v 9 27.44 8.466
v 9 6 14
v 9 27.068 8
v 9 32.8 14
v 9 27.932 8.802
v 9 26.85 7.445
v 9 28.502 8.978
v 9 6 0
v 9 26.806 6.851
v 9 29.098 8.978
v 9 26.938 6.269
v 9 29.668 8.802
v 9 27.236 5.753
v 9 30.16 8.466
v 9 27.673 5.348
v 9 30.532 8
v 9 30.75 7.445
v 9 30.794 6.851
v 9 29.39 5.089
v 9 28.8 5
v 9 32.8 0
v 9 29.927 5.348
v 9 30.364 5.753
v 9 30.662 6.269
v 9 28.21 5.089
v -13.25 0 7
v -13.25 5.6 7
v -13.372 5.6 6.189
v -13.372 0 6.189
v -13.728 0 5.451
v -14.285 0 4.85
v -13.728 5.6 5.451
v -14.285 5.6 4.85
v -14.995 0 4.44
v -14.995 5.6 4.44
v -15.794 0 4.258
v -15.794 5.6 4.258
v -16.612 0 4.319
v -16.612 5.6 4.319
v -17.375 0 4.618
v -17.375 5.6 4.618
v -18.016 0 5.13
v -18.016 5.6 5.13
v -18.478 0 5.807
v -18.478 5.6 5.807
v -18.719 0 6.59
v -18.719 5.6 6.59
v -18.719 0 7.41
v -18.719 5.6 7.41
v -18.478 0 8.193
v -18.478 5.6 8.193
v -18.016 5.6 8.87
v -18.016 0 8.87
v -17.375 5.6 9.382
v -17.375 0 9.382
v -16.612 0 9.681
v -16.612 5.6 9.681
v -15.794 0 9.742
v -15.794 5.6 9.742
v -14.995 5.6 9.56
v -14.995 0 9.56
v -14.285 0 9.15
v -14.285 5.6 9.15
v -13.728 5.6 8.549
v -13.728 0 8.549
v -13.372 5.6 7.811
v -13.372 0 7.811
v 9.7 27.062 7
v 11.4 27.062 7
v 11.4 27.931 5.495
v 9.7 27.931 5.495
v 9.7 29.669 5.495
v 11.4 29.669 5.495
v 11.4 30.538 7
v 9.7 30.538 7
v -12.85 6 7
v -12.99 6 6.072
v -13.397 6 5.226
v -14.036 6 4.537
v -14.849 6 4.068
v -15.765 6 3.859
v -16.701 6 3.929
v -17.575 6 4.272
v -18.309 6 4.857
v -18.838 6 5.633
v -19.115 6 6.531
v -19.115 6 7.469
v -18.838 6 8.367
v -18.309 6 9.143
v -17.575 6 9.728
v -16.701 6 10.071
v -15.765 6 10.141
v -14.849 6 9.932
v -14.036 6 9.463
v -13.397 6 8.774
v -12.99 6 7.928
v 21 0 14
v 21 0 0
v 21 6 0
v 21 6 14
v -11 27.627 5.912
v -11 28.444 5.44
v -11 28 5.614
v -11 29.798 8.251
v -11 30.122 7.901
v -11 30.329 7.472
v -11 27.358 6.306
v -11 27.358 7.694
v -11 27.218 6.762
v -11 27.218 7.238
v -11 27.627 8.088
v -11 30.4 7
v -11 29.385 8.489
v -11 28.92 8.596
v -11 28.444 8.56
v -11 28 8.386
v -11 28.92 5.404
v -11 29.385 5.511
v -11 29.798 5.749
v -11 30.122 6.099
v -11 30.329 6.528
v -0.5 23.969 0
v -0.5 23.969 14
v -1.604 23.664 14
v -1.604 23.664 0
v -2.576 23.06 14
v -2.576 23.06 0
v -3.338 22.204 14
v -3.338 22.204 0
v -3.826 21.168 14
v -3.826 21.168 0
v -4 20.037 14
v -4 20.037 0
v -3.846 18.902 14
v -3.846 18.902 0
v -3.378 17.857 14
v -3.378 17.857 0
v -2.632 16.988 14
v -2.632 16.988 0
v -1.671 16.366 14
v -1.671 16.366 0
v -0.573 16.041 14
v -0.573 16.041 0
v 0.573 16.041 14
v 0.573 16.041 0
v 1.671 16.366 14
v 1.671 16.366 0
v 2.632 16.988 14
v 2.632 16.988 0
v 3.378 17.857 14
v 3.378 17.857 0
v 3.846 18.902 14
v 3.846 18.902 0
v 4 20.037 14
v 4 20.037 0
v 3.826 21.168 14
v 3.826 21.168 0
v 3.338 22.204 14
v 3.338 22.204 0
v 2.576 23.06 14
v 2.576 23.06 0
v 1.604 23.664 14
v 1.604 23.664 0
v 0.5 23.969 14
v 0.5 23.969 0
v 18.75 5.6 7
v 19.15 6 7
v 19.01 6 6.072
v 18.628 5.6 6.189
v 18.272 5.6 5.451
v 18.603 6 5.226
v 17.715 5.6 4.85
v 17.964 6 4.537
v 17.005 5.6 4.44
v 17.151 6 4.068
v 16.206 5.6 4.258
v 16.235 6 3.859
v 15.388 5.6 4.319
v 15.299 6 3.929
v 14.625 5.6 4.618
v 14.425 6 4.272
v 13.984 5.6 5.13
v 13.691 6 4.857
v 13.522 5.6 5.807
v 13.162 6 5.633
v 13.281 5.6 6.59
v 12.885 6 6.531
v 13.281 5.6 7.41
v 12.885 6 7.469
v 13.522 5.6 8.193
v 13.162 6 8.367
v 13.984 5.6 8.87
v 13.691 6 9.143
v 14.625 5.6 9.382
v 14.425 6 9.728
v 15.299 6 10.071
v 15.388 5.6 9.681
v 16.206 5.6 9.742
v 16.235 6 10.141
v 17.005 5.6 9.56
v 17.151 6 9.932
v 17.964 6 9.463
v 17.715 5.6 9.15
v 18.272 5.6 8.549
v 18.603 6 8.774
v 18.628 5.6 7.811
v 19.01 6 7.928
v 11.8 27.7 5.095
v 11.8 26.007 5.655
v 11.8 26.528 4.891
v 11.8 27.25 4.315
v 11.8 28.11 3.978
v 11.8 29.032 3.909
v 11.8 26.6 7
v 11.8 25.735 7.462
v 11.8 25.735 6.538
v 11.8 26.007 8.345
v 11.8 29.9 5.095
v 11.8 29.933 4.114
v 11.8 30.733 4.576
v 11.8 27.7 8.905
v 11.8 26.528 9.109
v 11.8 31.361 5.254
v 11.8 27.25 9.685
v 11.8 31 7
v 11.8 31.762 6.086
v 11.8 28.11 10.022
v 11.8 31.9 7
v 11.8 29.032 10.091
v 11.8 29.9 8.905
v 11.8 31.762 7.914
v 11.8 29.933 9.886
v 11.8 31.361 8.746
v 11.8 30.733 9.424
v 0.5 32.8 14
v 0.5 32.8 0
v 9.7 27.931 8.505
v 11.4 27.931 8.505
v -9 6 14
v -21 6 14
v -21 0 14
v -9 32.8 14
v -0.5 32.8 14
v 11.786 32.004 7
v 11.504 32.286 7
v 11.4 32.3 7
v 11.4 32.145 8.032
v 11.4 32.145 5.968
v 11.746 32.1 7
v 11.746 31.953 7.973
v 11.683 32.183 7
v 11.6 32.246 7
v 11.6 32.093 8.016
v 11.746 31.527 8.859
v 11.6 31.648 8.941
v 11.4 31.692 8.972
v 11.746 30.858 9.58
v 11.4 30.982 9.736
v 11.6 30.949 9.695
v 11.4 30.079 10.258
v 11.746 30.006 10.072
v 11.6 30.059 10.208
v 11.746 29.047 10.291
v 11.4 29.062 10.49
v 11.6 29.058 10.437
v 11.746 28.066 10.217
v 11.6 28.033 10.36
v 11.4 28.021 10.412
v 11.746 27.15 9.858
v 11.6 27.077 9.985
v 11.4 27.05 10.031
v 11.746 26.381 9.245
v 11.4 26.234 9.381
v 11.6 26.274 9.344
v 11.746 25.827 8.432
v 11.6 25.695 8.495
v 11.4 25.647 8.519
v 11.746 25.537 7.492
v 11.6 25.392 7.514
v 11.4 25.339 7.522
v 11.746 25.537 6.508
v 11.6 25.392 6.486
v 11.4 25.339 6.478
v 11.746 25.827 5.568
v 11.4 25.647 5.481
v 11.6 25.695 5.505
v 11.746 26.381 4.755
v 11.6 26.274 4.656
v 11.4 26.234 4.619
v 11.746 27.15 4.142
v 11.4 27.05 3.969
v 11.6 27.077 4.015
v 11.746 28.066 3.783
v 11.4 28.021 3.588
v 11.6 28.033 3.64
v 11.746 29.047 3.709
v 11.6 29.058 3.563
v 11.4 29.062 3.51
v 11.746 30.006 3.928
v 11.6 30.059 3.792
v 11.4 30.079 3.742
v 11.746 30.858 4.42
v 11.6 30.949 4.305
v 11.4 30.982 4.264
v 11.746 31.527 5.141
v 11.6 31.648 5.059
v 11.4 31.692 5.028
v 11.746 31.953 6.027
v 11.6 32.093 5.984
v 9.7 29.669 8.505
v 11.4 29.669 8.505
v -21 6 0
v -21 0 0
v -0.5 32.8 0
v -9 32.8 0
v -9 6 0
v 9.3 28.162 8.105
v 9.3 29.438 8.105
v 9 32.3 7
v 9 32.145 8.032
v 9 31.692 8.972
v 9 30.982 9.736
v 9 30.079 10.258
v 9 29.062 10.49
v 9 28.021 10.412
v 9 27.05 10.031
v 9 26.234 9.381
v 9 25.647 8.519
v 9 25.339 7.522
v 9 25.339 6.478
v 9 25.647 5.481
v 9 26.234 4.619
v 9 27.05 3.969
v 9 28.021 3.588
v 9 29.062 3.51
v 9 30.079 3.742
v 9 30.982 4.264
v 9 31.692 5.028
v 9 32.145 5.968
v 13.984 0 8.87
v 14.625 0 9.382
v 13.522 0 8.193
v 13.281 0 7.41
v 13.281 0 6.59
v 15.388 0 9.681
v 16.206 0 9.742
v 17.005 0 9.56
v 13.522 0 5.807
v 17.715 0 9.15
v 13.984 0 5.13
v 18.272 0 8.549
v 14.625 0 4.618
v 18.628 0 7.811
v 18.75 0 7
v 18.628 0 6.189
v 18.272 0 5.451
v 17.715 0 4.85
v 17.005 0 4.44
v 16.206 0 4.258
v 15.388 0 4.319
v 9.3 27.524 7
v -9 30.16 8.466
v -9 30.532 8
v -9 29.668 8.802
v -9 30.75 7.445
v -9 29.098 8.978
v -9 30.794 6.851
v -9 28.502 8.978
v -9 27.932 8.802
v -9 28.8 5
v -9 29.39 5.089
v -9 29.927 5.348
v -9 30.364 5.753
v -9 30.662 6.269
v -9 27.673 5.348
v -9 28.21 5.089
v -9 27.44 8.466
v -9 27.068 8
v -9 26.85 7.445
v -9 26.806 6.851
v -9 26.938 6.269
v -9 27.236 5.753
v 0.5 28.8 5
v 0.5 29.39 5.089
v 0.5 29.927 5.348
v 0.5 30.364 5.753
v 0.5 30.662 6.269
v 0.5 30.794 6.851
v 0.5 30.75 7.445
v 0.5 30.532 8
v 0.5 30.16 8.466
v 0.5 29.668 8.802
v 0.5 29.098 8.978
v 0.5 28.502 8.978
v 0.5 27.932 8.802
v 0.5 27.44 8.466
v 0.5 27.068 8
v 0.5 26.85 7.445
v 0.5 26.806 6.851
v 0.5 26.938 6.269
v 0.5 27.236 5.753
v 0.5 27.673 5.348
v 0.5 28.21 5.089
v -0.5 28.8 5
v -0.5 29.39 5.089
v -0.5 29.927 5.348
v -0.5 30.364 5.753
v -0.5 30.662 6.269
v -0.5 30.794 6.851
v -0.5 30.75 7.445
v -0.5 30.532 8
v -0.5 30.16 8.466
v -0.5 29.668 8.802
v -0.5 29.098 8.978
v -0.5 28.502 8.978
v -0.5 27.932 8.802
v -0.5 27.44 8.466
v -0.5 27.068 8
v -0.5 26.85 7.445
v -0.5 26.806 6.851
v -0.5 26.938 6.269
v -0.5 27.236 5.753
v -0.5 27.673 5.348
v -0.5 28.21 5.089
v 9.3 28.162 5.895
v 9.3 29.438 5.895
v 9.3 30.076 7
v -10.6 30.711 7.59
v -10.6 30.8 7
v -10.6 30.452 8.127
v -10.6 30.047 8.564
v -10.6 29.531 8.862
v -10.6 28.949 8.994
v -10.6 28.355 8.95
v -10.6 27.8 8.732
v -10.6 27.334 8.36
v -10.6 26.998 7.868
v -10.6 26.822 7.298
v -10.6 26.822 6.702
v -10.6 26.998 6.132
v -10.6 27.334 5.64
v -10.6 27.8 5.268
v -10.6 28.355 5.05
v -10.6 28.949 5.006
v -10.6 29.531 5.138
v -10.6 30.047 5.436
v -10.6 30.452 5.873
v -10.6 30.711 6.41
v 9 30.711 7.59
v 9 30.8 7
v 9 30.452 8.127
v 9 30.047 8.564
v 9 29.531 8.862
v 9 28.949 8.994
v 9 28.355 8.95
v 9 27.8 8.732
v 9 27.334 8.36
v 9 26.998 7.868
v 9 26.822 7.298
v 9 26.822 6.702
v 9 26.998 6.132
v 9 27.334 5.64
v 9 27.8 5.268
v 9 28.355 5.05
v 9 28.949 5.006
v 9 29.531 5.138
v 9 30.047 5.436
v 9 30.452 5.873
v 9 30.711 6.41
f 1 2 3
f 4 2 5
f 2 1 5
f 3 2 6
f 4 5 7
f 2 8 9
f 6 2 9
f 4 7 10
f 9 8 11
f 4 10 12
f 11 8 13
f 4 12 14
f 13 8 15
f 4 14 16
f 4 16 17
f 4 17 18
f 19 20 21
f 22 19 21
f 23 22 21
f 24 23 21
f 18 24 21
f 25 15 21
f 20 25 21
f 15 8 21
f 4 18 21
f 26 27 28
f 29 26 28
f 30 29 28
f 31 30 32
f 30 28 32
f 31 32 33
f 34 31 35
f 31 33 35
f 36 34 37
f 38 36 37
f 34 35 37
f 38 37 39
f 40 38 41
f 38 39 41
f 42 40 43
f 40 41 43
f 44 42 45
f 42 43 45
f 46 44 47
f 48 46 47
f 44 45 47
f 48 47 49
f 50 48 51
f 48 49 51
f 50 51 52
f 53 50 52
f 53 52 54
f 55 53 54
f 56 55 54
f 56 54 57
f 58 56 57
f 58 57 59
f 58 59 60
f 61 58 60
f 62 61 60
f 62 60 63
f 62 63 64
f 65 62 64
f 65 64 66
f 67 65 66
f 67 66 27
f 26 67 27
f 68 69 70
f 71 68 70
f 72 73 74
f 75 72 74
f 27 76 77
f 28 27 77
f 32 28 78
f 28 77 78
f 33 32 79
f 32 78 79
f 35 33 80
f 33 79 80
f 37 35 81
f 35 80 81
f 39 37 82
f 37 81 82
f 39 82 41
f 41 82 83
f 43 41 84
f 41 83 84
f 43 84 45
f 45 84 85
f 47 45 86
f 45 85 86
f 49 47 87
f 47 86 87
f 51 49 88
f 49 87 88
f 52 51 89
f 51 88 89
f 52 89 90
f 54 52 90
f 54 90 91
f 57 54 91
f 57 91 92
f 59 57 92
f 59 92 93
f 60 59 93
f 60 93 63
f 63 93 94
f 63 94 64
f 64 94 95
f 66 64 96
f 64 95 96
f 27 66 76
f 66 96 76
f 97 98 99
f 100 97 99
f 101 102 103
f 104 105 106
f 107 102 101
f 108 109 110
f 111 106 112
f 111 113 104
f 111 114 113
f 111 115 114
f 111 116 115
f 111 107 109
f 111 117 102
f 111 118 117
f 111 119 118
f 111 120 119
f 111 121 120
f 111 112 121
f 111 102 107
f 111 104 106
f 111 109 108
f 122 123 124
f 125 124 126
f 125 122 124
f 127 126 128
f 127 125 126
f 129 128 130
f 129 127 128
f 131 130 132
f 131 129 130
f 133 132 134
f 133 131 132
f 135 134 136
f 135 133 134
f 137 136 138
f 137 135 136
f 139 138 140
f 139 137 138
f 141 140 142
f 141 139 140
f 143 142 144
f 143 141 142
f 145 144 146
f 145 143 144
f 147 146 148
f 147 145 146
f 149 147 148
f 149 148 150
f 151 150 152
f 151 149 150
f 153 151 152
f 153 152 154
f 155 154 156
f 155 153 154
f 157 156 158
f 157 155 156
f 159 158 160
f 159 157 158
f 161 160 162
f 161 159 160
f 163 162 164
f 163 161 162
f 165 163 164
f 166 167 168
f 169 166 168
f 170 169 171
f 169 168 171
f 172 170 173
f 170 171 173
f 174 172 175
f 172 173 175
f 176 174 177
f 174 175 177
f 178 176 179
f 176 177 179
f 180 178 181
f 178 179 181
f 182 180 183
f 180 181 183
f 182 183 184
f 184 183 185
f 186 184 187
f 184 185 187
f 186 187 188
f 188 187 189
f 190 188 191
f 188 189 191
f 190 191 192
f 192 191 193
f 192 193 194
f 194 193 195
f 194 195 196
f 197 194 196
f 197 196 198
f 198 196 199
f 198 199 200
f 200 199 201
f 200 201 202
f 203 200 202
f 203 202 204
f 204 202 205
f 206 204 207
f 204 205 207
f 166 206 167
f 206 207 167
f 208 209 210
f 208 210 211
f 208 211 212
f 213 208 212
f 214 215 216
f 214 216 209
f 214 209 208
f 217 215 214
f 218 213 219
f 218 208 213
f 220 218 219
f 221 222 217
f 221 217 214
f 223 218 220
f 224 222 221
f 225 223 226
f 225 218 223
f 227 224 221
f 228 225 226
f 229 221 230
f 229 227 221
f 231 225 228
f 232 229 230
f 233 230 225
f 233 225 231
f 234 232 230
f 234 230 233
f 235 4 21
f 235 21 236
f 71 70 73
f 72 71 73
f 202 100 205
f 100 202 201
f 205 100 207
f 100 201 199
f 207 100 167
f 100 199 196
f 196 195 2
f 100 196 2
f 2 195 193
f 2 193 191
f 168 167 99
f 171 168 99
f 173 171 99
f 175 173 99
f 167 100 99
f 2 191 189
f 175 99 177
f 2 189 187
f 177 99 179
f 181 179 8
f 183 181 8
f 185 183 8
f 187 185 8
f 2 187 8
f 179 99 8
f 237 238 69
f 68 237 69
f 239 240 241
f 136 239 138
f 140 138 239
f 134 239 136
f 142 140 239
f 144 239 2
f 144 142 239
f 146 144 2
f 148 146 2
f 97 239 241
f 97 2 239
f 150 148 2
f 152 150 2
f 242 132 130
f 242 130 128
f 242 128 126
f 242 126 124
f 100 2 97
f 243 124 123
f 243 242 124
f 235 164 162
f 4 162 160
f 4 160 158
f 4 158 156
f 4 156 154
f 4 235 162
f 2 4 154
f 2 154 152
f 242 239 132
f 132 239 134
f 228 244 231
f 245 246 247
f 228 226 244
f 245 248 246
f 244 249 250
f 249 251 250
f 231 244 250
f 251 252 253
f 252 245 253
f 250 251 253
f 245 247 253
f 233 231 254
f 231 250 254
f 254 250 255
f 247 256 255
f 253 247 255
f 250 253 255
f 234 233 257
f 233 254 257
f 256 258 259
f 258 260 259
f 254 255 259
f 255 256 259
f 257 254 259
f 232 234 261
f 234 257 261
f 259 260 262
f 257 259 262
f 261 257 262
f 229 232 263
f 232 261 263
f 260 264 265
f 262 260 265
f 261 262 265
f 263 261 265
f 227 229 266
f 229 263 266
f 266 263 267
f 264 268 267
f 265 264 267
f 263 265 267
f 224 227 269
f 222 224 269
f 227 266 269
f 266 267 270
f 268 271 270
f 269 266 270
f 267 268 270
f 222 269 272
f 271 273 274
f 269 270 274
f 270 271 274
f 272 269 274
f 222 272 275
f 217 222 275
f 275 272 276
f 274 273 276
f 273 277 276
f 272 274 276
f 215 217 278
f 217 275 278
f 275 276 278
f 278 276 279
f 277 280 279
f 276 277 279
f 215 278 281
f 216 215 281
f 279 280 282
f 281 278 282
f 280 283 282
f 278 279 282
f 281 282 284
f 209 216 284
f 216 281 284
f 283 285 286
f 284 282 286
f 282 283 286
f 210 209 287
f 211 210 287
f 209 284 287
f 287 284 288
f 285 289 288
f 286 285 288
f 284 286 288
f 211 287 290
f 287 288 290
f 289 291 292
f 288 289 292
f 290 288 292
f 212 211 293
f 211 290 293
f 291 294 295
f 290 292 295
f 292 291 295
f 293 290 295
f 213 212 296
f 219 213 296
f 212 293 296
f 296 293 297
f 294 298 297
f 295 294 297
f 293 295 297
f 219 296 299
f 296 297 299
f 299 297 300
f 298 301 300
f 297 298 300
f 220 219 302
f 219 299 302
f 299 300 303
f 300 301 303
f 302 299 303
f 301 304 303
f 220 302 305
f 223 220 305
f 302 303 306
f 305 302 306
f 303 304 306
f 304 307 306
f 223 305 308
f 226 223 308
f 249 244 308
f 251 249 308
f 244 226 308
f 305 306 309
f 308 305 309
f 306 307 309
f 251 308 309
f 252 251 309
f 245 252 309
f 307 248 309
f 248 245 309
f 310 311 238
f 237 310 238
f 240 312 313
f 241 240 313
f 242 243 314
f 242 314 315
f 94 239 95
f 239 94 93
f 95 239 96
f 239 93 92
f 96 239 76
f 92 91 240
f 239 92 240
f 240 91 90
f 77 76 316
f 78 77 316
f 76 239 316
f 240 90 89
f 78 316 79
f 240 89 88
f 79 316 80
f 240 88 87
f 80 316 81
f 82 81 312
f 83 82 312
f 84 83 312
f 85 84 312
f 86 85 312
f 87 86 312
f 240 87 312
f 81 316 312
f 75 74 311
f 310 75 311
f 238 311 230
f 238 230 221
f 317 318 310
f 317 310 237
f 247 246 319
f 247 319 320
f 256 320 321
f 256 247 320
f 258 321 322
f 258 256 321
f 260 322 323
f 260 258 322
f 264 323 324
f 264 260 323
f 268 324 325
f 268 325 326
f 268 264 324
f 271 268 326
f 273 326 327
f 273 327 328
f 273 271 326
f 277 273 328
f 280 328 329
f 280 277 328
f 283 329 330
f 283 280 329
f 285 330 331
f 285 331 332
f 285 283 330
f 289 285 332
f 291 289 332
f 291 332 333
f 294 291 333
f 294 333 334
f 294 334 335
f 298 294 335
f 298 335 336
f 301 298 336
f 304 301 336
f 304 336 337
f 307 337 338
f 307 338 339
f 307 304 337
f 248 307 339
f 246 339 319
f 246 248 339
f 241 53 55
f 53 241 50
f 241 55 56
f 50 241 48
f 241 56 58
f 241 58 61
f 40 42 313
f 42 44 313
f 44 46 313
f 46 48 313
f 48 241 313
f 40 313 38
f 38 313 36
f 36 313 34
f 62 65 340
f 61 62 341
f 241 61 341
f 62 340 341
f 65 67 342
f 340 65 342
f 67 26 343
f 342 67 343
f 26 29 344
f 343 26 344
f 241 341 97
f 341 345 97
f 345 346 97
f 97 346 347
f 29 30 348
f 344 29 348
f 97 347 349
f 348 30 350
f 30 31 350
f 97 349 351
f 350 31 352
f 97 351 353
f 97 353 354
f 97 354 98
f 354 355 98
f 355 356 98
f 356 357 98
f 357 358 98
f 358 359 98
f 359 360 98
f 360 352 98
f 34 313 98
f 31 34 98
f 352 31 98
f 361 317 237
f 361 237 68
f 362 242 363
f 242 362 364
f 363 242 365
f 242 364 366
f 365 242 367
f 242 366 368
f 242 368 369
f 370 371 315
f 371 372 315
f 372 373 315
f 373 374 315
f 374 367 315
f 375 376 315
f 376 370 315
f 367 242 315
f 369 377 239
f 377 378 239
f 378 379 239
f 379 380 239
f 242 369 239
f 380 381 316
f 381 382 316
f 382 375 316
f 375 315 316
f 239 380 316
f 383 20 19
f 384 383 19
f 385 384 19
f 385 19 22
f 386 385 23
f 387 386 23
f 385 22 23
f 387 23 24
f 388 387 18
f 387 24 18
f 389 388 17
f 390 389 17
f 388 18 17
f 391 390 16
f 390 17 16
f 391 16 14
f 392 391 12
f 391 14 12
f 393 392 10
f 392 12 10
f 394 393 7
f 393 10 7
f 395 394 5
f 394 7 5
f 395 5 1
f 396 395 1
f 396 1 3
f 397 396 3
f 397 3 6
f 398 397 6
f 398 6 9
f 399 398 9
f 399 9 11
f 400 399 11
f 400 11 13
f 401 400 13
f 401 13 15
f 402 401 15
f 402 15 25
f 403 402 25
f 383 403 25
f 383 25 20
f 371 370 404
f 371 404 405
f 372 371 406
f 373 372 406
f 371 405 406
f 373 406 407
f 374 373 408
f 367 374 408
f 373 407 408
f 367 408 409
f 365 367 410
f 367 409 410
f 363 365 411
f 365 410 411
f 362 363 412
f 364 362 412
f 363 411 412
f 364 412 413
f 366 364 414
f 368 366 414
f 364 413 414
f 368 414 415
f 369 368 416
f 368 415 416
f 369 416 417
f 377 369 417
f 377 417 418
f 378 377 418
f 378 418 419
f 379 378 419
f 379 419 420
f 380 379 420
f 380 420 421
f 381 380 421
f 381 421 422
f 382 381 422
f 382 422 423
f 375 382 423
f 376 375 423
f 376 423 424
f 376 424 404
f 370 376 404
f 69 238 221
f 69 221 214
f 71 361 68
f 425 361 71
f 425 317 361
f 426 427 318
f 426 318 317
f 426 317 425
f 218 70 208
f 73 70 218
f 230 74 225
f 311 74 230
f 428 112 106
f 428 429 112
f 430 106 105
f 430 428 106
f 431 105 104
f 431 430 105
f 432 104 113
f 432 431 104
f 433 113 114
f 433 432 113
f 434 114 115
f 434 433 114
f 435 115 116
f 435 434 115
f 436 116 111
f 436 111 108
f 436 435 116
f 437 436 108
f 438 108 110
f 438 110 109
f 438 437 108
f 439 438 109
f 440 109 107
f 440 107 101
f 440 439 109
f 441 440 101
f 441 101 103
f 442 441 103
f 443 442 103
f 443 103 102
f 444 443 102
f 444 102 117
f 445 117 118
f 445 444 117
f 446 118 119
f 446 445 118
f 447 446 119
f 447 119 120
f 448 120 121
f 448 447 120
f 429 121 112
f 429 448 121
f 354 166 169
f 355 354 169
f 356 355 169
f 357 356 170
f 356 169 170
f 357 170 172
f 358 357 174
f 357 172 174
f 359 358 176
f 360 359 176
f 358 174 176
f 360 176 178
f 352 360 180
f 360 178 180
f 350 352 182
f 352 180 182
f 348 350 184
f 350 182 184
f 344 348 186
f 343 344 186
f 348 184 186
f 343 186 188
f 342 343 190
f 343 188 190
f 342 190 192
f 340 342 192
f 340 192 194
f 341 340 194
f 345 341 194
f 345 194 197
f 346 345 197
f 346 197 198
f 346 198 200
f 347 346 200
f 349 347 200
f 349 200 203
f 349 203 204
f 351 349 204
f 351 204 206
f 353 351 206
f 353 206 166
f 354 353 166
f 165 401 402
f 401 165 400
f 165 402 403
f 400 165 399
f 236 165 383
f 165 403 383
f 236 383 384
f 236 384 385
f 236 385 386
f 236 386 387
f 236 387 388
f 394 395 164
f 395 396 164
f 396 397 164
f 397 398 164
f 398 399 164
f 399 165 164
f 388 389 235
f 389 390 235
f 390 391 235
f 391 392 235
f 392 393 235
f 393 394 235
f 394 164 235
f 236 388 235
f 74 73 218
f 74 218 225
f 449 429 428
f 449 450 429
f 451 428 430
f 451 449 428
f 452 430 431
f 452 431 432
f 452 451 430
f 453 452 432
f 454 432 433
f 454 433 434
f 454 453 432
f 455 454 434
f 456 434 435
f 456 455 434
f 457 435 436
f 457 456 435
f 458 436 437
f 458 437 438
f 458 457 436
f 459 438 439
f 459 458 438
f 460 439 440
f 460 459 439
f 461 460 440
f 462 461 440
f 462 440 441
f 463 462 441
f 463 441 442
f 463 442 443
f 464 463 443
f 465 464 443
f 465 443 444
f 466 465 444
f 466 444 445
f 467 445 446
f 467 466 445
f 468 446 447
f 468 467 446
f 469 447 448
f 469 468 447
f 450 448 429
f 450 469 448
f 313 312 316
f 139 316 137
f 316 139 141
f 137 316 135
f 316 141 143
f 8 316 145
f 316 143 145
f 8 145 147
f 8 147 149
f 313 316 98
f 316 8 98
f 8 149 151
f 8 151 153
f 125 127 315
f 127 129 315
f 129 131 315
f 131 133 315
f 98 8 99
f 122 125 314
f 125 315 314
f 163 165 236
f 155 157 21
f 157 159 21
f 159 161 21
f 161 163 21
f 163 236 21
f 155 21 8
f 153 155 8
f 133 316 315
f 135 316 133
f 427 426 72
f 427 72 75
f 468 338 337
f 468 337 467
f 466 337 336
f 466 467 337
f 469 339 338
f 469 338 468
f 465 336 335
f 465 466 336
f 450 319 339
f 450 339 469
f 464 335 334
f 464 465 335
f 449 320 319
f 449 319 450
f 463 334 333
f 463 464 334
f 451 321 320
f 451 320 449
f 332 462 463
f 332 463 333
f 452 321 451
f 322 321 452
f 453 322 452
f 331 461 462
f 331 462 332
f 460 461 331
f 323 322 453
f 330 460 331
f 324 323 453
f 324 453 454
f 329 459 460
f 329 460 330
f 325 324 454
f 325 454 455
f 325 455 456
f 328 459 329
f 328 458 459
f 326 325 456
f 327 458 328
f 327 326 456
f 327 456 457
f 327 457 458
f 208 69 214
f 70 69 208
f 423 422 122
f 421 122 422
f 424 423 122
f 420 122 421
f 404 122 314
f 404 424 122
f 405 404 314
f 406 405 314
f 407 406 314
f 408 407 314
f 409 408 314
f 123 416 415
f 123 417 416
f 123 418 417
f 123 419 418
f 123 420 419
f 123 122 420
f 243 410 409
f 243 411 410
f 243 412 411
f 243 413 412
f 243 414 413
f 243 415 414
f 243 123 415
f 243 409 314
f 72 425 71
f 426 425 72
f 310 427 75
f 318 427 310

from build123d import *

# Parameters (mm, degrees)
SKETCH1_R                = 4
BOSS_EXTRUDE1_DEPTH      = 14
SKETCH3_W                = 1
SKETCH3_H                = 11.790173319
CUT_EXTRUDE1_DEPTH       = 19
SKETCH2_R                = 2
CUT_EXTRUDE3_DEPTH       = 31
SKETCH5_R                = 2.75
CUT_EXTRUDE5_DEPTH       = 22
TAGLIO_ESTRUSIONE1_DEPTH = 2.5
SMUSSO1_SIZE             = 0.4
RACCORDO1_R              = 0.4
SMUSSO2_SIZE             = 0.4


with BuildPart() as part:
    # Sketch1 → Boss-Extrude1 (new body)
    with BuildSketch(Plane.XY):
        Polygon((-21, 0), (21, 0), (21, 6), (9, 6), (9, 32.8), (-9, 32.8), (-9, 6), (-21, 6), align=None)
        with Locations((0, 20)):
            Circle(SKETCH1_R, mode=Mode.SUBTRACT)
    extrude(amount=BOSS_EXTRUDE1_DEPTH)

    # Sketch3 → Cut-Extrude1 (cut)
    with BuildSketch(Plane.XY.offset(14)):
        with Locations((0, 26.904913341)):
            Rectangle(SKETCH3_W, SKETCH3_H)
    extrude(amount=-CUT_EXTRUDE1_DEPTH, mode=Mode.SUBTRACT)

    # Sketch2 → Cut-Extrude3 (cut)
    with BuildSketch(Plane(origin=(9, 0, 0), x_dir=(0, 0, -1), z_dir=(1, 0, 0))):
        with Locations((-7, 28.8)):
            Circle(SKETCH2_R)
    extrude(amount=-CUT_EXTRUDE3_DEPTH, mode=Mode.SUBTRACT)

    # Sketch5 → Cut-Extrude5 (cut)
    with BuildSketch(Plane(origin=(0, 6, 0), x_dir=(1, 0, 0), z_dir=(0, 1, 0))):
        with Locations((16, -7)):
            Circle(SKETCH5_R)
        with Locations((-16, -7)):
            Circle(SKETCH5_R)
    extrude(amount=-CUT_EXTRUDE5_DEPTH, mode=Mode.SUBTRACT)

    # Smusso2
    smusso2_edges = [part.edges().sort_by_distance(p)[0] for p in [
        (13.25, 6, 7),
        (-18.75, 6, 7),
    ]]
    chamfer(smusso2_edges, length=SMUSSO2_SIZE)


with BuildPart() as body_2:
    # Schizzo1 → Rivoluzione1 (revolve)
    with BuildSketch(Plane.XY.offset(7)):
        Polygon((11.8, 28.8), (-11, 28.8), (-11, 30.4), (-10.6, 30.8), (9, 30.8), (9, 32.3), (11.8, 32.3), align=None)
    revolve(axis=Axis((-22.704724307, 28.8, 7), (1, 0, 0)))

    # Schizzo2 → Taglio-Estrusione1 (cut)
    with BuildSketch(Plane(origin=(11.8, 0, 0), x_dir=(0, 0, -1), z_dir=(1, 0, 0))):
        Polygon((-7, 30.538280632), (-8.505395186, 29.669140316), (-8.505395186, 27.930859684), (-7, 27.061719368), (-5.494604814, 27.930859684), (-5.494604814, 29.669140316), align=None)
    extrude(amount=-TAGLIO_ESTRUSIONE1_DEPTH, mode=Mode.SUBTRACT)

    # Smusso1
    smusso1_edges = [body_2.edges().sort_by_distance(p)[0] for p in [
        (9.3, 30.103710474, 6.247302407),
        (9.3, 28.8, 5.494604814),
        (9.3, 27.496289526, 6.247302407),
        (9.3, 27.496289526, 7.752697593),
        (9.3, 28.8, 8.505395186),
        (9.3, 30.103710474, 7.752697593),
        (11.8, 30.103710474, 6.247302407),
        (11.8, 30.103710474, 7.752697593),
        (11.8, 28.8, 8.505395186),
        (11.8, 27.496289526, 7.752697593),
        (11.8, 27.496289526, 6.247302407),
        (11.8, 28.8, 5.494604814),
    ]]
    chamfer(smusso1_edges, length=SMUSSO1_SIZE)

    # Raccordo1
    raccordo1_edges = [body_2.edges().sort_by_distance(p)[0] for p in [
        (11.8, 25.3, 7),
    ]]
    fillet(raccordo1_edges, radius=RACCORDO1_R)


solid = Compound([part.part, body_2.part])
